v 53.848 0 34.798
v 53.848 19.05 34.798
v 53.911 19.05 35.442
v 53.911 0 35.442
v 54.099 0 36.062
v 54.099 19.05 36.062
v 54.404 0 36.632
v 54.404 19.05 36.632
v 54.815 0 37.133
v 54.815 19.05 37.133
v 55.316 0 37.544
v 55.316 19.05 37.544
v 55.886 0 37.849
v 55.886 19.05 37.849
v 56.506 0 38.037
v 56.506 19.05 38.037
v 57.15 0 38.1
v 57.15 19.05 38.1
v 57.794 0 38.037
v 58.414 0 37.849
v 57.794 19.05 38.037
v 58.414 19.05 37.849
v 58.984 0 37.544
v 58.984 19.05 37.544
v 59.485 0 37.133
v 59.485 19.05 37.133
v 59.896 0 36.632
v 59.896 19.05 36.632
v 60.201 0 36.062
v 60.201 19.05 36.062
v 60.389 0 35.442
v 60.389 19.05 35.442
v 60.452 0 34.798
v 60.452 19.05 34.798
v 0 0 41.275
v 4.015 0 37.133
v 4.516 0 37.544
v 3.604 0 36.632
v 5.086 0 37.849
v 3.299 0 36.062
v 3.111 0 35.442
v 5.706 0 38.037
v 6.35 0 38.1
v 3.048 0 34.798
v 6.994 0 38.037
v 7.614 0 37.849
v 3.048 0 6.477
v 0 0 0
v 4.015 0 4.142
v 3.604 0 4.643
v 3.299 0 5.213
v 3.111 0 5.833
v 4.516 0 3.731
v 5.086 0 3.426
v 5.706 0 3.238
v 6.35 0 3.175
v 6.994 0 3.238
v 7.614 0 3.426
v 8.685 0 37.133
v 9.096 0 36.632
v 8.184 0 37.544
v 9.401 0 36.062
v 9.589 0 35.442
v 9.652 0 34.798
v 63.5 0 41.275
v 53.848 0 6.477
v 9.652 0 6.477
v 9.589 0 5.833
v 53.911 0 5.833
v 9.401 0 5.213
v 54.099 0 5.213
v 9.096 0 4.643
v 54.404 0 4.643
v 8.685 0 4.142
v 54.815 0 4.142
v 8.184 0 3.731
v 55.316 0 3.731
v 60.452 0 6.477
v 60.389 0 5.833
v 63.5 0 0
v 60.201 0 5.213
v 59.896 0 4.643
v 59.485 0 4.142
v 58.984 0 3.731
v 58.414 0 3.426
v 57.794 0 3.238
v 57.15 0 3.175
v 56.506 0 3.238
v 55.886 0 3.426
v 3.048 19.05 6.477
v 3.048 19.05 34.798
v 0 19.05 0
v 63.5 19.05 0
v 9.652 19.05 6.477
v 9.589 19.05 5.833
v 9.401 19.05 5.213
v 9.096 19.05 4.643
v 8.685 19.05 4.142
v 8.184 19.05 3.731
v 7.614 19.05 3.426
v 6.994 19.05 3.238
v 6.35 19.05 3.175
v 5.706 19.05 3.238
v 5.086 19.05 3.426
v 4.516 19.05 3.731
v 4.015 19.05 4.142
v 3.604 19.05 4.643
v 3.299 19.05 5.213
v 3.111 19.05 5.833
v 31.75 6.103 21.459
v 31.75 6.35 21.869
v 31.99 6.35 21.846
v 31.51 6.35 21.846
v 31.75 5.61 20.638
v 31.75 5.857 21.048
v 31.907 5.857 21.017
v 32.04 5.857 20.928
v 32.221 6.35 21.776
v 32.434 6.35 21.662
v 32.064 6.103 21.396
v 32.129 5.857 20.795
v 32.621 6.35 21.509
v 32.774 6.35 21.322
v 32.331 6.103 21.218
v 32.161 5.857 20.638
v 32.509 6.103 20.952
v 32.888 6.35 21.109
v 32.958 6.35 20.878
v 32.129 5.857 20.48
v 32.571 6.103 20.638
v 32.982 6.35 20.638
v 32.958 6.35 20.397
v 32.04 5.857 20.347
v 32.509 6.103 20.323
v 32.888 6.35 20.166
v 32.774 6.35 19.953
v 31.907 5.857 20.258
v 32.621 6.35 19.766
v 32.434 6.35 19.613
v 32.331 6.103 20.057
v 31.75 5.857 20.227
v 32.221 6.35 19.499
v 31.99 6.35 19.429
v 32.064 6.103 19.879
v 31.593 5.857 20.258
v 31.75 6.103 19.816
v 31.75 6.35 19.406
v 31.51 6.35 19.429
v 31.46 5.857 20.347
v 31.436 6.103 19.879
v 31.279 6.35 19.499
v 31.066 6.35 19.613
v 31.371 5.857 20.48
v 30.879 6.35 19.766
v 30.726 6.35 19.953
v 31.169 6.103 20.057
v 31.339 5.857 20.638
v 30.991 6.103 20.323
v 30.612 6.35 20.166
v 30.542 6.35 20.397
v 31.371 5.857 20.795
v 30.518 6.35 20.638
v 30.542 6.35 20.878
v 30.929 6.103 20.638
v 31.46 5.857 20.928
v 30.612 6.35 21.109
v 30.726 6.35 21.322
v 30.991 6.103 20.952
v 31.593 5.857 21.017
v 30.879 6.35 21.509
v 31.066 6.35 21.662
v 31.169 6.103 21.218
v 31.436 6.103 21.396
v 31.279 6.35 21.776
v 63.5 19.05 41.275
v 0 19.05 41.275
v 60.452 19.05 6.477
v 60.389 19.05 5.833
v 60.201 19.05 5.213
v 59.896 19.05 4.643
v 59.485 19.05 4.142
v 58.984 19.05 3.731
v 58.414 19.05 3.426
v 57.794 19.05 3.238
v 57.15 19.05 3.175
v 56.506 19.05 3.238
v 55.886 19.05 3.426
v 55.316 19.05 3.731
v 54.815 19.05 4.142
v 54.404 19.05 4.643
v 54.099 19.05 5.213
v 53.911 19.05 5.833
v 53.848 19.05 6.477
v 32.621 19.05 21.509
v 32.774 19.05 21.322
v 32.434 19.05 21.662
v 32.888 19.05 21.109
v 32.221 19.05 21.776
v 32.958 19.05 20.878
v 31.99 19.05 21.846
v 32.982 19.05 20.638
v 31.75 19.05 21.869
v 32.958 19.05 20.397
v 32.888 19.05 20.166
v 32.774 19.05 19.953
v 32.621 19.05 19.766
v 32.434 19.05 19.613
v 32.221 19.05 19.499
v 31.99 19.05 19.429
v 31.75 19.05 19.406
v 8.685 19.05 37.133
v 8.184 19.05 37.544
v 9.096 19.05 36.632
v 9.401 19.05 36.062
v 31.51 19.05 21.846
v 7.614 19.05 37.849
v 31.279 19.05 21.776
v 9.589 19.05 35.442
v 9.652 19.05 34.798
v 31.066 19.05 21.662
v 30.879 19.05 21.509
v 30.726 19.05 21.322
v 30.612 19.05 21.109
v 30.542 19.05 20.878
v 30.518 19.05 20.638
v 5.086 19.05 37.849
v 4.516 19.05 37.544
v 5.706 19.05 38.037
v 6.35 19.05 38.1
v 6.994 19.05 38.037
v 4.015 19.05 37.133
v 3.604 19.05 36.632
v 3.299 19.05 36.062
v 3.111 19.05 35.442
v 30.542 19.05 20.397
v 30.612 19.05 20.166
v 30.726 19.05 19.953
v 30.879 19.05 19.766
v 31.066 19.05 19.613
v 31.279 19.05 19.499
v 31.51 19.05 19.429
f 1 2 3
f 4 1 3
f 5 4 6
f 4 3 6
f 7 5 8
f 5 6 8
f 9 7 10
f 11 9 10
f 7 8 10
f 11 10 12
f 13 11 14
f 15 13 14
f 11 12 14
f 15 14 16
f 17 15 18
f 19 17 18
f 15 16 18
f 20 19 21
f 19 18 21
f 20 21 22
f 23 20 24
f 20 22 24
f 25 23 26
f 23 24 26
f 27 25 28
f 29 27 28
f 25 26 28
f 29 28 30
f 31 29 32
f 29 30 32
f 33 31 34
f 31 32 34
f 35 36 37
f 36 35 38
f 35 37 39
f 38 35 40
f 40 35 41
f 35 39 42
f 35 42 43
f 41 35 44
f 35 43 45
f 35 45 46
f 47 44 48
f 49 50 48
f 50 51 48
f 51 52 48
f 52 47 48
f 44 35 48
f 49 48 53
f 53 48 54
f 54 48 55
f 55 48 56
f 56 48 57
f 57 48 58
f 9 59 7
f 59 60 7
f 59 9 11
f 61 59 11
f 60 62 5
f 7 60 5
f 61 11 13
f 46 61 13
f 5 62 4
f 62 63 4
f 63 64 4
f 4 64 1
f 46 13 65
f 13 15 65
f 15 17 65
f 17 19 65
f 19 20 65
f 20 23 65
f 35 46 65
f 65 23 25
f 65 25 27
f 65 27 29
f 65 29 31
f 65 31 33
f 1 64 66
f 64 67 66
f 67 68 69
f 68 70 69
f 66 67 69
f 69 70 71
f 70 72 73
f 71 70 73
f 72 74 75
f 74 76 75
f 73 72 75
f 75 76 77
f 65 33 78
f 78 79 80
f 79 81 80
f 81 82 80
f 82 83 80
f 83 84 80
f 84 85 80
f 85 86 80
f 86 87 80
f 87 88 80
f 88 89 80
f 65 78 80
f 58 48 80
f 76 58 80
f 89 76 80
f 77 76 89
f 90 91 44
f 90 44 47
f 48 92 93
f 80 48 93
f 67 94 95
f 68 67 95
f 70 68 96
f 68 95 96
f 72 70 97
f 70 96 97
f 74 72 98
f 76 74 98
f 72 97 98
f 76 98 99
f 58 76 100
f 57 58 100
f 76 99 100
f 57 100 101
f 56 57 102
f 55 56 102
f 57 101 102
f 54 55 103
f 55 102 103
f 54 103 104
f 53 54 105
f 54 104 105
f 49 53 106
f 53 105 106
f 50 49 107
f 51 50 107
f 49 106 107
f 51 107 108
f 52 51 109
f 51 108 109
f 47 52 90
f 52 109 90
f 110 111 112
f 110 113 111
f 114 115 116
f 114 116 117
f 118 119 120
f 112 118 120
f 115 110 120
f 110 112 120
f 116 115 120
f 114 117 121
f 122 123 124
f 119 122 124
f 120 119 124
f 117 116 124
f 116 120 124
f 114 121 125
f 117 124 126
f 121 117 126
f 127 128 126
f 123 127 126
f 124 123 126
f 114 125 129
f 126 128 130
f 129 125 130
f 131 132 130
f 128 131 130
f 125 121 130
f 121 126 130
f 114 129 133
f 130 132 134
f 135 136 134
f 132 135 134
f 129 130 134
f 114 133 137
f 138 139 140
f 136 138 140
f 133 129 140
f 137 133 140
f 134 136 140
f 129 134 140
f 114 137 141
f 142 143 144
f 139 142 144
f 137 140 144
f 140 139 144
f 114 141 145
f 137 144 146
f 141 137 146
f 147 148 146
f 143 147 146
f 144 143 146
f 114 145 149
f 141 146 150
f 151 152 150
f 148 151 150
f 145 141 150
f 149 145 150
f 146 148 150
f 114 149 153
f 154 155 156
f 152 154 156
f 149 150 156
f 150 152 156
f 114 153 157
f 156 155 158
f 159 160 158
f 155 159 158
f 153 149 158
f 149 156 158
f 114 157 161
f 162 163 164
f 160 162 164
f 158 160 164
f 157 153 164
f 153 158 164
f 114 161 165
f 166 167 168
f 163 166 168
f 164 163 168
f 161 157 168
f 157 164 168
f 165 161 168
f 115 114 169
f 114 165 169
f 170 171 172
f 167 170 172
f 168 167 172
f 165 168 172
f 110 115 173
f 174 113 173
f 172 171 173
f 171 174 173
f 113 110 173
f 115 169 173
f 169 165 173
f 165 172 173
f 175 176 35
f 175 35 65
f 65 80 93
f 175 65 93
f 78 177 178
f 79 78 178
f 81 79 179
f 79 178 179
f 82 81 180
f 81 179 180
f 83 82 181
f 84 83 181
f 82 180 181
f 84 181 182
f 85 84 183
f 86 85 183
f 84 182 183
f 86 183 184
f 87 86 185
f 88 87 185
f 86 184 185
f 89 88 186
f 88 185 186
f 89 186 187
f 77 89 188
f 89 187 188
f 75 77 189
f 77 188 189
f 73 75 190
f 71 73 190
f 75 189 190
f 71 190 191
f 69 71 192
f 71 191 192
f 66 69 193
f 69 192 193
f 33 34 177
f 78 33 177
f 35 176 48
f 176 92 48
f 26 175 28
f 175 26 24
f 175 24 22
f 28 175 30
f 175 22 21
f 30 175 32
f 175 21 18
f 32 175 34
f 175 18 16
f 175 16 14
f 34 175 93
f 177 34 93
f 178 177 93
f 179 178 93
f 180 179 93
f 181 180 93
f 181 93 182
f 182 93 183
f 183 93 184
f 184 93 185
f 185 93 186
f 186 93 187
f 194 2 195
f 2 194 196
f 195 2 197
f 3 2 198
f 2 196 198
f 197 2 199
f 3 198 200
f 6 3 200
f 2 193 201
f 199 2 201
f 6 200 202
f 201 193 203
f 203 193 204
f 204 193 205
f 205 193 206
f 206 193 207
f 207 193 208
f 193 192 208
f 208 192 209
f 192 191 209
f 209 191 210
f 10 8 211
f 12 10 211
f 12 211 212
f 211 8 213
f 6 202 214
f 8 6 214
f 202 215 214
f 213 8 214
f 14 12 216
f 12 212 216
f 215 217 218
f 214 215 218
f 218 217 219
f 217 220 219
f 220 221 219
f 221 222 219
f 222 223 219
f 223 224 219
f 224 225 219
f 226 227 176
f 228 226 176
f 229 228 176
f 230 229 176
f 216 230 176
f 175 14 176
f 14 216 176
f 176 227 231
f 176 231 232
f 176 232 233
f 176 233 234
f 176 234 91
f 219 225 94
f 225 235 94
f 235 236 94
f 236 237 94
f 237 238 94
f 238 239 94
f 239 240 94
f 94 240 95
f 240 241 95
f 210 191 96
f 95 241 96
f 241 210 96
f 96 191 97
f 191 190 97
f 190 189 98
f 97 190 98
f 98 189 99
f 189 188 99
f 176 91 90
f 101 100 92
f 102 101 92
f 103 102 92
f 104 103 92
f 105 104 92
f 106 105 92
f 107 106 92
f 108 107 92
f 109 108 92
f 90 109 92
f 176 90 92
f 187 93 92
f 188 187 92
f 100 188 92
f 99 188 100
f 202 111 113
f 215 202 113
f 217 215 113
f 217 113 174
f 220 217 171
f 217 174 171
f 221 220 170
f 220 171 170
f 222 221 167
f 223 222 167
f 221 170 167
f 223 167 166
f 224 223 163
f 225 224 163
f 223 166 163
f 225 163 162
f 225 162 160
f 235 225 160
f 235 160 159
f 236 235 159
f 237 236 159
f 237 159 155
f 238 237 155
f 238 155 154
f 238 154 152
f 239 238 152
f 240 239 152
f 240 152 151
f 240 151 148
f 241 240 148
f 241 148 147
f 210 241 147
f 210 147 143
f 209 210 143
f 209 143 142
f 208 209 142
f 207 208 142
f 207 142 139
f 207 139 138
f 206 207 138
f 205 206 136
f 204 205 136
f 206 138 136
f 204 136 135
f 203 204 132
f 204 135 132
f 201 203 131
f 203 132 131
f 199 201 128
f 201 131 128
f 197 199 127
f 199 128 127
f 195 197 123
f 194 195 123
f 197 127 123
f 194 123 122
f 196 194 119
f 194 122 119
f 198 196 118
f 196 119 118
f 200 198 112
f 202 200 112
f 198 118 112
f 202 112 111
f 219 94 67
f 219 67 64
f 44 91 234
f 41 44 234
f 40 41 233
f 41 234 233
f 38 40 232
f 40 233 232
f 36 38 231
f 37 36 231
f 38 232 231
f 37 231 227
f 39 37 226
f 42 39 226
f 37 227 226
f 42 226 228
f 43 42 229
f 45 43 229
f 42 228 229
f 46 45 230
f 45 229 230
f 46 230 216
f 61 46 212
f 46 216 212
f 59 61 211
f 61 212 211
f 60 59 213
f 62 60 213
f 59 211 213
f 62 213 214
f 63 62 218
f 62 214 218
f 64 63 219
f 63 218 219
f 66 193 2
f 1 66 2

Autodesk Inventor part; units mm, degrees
ref_plane "YZ Plane" through (0, 0, 0) normal (1, 0, 0) x (0, 1, 0)
ref_plane "XZ Plane" through (0, 0, 0) normal (0, 1, 0) x (-1, 0, 0)
ref_plane "XY Plane" through (0, 0, 0) normal (0, 0, 1) x (1, 0, 0)
sketch "Sketch1" plane through (0, 0, 0) normal (0, 0, 1) x (1, 0, 0)
  line L0 (0, 0) -> (63.5, 0)
  line L1 (63.5, 0) -> (63.5, 19.05)
  line L2 (63.5, 19.05) -> (0, 19.05)
  line L3 (0, 19.05) -> (0, 0)
  dimension "d2" = 63.5
  dimension "d3" = 19.05
extrude "Extrusion1" add sketch "Sketch1" along normal blind 41.275
sketch "Sketch2" plane through (0, 19.05, 0) normal (0, 1, 0) x (1, 0, 0)
  line L0 (63.5, 0) -> (0, 0) projected
  line L1 (0, 0) -> (0, -41.275) projected
  point P0 (31.75, -20.6375)
  dimension "d4" = 20.6375
  dimension "d5" = 31.75
hole "Hole1" at (31.75, 19.05, 20.6375) direction (0, -1, 0) diameter 2.4638 depth 12.7 tip angle 118
sketch "Sketch3" plane through (0, 19.05, 0) normal (0, 1, 0) x (1, 0, 0)
  line L0 (6.35, -34.798) -> (6.35, -6.477) construction
  line L1 (3.048, -34.798) -> (3.048, -6.477)
  line L2 (9.652, -6.477) -> (9.652, -34.798)
  arc A0 (3.048, -34.798) -> (9.652, -34.798) centre (6.35, -34.798) ccw
  arc A1 (9.652, -6.477) -> (3.048, -6.477) centre (6.35, -6.477) ccw
  line L3 (0, 0) -> (0, -41.275) projected
  line L4 (63.5, -41.275) -> (0, -41.275) projected
  line L5 (63.5, 0) -> (0, 0) projected
  circle A2 centre (31.75, -20.6375) radius 1.2319 projected
  circle A3 centre (31.75, -20.6375) radius 1.2319 projected
  line L6 (31.75, -20.6375) -> (31.75, 0) construction
  line L7 (57.15, -34.798) -> (57.15, -6.477) construction
  line L8 (60.452, -34.798) -> (60.452, -6.477)
  line L9 (53.848, -6.477) -> (53.848, -34.798)
  arc A4 (53.848, -34.798) -> (60.452, -34.798) centre (57.15, -34.798) ccw
  arc A5 (60.452, -6.477) -> (53.848, -6.477) centre (57.15, -6.477) ccw
  point P0 (6.35, -20.6375)
  point P1 (57.15, -20.6375)
  dimension "d13" = 6.604
  dimension "d15" = 3.175
  dimension "d16" = 3.175
  dimension "d17" = 25.4
extrude "Extrusion2" cut sketch "Sketch3" against normal blind 25.4 contours L1 A1 L2 A0 | A4 L9 A5 L8
properties part number "Track Foot" material "Aluminum 6061"
